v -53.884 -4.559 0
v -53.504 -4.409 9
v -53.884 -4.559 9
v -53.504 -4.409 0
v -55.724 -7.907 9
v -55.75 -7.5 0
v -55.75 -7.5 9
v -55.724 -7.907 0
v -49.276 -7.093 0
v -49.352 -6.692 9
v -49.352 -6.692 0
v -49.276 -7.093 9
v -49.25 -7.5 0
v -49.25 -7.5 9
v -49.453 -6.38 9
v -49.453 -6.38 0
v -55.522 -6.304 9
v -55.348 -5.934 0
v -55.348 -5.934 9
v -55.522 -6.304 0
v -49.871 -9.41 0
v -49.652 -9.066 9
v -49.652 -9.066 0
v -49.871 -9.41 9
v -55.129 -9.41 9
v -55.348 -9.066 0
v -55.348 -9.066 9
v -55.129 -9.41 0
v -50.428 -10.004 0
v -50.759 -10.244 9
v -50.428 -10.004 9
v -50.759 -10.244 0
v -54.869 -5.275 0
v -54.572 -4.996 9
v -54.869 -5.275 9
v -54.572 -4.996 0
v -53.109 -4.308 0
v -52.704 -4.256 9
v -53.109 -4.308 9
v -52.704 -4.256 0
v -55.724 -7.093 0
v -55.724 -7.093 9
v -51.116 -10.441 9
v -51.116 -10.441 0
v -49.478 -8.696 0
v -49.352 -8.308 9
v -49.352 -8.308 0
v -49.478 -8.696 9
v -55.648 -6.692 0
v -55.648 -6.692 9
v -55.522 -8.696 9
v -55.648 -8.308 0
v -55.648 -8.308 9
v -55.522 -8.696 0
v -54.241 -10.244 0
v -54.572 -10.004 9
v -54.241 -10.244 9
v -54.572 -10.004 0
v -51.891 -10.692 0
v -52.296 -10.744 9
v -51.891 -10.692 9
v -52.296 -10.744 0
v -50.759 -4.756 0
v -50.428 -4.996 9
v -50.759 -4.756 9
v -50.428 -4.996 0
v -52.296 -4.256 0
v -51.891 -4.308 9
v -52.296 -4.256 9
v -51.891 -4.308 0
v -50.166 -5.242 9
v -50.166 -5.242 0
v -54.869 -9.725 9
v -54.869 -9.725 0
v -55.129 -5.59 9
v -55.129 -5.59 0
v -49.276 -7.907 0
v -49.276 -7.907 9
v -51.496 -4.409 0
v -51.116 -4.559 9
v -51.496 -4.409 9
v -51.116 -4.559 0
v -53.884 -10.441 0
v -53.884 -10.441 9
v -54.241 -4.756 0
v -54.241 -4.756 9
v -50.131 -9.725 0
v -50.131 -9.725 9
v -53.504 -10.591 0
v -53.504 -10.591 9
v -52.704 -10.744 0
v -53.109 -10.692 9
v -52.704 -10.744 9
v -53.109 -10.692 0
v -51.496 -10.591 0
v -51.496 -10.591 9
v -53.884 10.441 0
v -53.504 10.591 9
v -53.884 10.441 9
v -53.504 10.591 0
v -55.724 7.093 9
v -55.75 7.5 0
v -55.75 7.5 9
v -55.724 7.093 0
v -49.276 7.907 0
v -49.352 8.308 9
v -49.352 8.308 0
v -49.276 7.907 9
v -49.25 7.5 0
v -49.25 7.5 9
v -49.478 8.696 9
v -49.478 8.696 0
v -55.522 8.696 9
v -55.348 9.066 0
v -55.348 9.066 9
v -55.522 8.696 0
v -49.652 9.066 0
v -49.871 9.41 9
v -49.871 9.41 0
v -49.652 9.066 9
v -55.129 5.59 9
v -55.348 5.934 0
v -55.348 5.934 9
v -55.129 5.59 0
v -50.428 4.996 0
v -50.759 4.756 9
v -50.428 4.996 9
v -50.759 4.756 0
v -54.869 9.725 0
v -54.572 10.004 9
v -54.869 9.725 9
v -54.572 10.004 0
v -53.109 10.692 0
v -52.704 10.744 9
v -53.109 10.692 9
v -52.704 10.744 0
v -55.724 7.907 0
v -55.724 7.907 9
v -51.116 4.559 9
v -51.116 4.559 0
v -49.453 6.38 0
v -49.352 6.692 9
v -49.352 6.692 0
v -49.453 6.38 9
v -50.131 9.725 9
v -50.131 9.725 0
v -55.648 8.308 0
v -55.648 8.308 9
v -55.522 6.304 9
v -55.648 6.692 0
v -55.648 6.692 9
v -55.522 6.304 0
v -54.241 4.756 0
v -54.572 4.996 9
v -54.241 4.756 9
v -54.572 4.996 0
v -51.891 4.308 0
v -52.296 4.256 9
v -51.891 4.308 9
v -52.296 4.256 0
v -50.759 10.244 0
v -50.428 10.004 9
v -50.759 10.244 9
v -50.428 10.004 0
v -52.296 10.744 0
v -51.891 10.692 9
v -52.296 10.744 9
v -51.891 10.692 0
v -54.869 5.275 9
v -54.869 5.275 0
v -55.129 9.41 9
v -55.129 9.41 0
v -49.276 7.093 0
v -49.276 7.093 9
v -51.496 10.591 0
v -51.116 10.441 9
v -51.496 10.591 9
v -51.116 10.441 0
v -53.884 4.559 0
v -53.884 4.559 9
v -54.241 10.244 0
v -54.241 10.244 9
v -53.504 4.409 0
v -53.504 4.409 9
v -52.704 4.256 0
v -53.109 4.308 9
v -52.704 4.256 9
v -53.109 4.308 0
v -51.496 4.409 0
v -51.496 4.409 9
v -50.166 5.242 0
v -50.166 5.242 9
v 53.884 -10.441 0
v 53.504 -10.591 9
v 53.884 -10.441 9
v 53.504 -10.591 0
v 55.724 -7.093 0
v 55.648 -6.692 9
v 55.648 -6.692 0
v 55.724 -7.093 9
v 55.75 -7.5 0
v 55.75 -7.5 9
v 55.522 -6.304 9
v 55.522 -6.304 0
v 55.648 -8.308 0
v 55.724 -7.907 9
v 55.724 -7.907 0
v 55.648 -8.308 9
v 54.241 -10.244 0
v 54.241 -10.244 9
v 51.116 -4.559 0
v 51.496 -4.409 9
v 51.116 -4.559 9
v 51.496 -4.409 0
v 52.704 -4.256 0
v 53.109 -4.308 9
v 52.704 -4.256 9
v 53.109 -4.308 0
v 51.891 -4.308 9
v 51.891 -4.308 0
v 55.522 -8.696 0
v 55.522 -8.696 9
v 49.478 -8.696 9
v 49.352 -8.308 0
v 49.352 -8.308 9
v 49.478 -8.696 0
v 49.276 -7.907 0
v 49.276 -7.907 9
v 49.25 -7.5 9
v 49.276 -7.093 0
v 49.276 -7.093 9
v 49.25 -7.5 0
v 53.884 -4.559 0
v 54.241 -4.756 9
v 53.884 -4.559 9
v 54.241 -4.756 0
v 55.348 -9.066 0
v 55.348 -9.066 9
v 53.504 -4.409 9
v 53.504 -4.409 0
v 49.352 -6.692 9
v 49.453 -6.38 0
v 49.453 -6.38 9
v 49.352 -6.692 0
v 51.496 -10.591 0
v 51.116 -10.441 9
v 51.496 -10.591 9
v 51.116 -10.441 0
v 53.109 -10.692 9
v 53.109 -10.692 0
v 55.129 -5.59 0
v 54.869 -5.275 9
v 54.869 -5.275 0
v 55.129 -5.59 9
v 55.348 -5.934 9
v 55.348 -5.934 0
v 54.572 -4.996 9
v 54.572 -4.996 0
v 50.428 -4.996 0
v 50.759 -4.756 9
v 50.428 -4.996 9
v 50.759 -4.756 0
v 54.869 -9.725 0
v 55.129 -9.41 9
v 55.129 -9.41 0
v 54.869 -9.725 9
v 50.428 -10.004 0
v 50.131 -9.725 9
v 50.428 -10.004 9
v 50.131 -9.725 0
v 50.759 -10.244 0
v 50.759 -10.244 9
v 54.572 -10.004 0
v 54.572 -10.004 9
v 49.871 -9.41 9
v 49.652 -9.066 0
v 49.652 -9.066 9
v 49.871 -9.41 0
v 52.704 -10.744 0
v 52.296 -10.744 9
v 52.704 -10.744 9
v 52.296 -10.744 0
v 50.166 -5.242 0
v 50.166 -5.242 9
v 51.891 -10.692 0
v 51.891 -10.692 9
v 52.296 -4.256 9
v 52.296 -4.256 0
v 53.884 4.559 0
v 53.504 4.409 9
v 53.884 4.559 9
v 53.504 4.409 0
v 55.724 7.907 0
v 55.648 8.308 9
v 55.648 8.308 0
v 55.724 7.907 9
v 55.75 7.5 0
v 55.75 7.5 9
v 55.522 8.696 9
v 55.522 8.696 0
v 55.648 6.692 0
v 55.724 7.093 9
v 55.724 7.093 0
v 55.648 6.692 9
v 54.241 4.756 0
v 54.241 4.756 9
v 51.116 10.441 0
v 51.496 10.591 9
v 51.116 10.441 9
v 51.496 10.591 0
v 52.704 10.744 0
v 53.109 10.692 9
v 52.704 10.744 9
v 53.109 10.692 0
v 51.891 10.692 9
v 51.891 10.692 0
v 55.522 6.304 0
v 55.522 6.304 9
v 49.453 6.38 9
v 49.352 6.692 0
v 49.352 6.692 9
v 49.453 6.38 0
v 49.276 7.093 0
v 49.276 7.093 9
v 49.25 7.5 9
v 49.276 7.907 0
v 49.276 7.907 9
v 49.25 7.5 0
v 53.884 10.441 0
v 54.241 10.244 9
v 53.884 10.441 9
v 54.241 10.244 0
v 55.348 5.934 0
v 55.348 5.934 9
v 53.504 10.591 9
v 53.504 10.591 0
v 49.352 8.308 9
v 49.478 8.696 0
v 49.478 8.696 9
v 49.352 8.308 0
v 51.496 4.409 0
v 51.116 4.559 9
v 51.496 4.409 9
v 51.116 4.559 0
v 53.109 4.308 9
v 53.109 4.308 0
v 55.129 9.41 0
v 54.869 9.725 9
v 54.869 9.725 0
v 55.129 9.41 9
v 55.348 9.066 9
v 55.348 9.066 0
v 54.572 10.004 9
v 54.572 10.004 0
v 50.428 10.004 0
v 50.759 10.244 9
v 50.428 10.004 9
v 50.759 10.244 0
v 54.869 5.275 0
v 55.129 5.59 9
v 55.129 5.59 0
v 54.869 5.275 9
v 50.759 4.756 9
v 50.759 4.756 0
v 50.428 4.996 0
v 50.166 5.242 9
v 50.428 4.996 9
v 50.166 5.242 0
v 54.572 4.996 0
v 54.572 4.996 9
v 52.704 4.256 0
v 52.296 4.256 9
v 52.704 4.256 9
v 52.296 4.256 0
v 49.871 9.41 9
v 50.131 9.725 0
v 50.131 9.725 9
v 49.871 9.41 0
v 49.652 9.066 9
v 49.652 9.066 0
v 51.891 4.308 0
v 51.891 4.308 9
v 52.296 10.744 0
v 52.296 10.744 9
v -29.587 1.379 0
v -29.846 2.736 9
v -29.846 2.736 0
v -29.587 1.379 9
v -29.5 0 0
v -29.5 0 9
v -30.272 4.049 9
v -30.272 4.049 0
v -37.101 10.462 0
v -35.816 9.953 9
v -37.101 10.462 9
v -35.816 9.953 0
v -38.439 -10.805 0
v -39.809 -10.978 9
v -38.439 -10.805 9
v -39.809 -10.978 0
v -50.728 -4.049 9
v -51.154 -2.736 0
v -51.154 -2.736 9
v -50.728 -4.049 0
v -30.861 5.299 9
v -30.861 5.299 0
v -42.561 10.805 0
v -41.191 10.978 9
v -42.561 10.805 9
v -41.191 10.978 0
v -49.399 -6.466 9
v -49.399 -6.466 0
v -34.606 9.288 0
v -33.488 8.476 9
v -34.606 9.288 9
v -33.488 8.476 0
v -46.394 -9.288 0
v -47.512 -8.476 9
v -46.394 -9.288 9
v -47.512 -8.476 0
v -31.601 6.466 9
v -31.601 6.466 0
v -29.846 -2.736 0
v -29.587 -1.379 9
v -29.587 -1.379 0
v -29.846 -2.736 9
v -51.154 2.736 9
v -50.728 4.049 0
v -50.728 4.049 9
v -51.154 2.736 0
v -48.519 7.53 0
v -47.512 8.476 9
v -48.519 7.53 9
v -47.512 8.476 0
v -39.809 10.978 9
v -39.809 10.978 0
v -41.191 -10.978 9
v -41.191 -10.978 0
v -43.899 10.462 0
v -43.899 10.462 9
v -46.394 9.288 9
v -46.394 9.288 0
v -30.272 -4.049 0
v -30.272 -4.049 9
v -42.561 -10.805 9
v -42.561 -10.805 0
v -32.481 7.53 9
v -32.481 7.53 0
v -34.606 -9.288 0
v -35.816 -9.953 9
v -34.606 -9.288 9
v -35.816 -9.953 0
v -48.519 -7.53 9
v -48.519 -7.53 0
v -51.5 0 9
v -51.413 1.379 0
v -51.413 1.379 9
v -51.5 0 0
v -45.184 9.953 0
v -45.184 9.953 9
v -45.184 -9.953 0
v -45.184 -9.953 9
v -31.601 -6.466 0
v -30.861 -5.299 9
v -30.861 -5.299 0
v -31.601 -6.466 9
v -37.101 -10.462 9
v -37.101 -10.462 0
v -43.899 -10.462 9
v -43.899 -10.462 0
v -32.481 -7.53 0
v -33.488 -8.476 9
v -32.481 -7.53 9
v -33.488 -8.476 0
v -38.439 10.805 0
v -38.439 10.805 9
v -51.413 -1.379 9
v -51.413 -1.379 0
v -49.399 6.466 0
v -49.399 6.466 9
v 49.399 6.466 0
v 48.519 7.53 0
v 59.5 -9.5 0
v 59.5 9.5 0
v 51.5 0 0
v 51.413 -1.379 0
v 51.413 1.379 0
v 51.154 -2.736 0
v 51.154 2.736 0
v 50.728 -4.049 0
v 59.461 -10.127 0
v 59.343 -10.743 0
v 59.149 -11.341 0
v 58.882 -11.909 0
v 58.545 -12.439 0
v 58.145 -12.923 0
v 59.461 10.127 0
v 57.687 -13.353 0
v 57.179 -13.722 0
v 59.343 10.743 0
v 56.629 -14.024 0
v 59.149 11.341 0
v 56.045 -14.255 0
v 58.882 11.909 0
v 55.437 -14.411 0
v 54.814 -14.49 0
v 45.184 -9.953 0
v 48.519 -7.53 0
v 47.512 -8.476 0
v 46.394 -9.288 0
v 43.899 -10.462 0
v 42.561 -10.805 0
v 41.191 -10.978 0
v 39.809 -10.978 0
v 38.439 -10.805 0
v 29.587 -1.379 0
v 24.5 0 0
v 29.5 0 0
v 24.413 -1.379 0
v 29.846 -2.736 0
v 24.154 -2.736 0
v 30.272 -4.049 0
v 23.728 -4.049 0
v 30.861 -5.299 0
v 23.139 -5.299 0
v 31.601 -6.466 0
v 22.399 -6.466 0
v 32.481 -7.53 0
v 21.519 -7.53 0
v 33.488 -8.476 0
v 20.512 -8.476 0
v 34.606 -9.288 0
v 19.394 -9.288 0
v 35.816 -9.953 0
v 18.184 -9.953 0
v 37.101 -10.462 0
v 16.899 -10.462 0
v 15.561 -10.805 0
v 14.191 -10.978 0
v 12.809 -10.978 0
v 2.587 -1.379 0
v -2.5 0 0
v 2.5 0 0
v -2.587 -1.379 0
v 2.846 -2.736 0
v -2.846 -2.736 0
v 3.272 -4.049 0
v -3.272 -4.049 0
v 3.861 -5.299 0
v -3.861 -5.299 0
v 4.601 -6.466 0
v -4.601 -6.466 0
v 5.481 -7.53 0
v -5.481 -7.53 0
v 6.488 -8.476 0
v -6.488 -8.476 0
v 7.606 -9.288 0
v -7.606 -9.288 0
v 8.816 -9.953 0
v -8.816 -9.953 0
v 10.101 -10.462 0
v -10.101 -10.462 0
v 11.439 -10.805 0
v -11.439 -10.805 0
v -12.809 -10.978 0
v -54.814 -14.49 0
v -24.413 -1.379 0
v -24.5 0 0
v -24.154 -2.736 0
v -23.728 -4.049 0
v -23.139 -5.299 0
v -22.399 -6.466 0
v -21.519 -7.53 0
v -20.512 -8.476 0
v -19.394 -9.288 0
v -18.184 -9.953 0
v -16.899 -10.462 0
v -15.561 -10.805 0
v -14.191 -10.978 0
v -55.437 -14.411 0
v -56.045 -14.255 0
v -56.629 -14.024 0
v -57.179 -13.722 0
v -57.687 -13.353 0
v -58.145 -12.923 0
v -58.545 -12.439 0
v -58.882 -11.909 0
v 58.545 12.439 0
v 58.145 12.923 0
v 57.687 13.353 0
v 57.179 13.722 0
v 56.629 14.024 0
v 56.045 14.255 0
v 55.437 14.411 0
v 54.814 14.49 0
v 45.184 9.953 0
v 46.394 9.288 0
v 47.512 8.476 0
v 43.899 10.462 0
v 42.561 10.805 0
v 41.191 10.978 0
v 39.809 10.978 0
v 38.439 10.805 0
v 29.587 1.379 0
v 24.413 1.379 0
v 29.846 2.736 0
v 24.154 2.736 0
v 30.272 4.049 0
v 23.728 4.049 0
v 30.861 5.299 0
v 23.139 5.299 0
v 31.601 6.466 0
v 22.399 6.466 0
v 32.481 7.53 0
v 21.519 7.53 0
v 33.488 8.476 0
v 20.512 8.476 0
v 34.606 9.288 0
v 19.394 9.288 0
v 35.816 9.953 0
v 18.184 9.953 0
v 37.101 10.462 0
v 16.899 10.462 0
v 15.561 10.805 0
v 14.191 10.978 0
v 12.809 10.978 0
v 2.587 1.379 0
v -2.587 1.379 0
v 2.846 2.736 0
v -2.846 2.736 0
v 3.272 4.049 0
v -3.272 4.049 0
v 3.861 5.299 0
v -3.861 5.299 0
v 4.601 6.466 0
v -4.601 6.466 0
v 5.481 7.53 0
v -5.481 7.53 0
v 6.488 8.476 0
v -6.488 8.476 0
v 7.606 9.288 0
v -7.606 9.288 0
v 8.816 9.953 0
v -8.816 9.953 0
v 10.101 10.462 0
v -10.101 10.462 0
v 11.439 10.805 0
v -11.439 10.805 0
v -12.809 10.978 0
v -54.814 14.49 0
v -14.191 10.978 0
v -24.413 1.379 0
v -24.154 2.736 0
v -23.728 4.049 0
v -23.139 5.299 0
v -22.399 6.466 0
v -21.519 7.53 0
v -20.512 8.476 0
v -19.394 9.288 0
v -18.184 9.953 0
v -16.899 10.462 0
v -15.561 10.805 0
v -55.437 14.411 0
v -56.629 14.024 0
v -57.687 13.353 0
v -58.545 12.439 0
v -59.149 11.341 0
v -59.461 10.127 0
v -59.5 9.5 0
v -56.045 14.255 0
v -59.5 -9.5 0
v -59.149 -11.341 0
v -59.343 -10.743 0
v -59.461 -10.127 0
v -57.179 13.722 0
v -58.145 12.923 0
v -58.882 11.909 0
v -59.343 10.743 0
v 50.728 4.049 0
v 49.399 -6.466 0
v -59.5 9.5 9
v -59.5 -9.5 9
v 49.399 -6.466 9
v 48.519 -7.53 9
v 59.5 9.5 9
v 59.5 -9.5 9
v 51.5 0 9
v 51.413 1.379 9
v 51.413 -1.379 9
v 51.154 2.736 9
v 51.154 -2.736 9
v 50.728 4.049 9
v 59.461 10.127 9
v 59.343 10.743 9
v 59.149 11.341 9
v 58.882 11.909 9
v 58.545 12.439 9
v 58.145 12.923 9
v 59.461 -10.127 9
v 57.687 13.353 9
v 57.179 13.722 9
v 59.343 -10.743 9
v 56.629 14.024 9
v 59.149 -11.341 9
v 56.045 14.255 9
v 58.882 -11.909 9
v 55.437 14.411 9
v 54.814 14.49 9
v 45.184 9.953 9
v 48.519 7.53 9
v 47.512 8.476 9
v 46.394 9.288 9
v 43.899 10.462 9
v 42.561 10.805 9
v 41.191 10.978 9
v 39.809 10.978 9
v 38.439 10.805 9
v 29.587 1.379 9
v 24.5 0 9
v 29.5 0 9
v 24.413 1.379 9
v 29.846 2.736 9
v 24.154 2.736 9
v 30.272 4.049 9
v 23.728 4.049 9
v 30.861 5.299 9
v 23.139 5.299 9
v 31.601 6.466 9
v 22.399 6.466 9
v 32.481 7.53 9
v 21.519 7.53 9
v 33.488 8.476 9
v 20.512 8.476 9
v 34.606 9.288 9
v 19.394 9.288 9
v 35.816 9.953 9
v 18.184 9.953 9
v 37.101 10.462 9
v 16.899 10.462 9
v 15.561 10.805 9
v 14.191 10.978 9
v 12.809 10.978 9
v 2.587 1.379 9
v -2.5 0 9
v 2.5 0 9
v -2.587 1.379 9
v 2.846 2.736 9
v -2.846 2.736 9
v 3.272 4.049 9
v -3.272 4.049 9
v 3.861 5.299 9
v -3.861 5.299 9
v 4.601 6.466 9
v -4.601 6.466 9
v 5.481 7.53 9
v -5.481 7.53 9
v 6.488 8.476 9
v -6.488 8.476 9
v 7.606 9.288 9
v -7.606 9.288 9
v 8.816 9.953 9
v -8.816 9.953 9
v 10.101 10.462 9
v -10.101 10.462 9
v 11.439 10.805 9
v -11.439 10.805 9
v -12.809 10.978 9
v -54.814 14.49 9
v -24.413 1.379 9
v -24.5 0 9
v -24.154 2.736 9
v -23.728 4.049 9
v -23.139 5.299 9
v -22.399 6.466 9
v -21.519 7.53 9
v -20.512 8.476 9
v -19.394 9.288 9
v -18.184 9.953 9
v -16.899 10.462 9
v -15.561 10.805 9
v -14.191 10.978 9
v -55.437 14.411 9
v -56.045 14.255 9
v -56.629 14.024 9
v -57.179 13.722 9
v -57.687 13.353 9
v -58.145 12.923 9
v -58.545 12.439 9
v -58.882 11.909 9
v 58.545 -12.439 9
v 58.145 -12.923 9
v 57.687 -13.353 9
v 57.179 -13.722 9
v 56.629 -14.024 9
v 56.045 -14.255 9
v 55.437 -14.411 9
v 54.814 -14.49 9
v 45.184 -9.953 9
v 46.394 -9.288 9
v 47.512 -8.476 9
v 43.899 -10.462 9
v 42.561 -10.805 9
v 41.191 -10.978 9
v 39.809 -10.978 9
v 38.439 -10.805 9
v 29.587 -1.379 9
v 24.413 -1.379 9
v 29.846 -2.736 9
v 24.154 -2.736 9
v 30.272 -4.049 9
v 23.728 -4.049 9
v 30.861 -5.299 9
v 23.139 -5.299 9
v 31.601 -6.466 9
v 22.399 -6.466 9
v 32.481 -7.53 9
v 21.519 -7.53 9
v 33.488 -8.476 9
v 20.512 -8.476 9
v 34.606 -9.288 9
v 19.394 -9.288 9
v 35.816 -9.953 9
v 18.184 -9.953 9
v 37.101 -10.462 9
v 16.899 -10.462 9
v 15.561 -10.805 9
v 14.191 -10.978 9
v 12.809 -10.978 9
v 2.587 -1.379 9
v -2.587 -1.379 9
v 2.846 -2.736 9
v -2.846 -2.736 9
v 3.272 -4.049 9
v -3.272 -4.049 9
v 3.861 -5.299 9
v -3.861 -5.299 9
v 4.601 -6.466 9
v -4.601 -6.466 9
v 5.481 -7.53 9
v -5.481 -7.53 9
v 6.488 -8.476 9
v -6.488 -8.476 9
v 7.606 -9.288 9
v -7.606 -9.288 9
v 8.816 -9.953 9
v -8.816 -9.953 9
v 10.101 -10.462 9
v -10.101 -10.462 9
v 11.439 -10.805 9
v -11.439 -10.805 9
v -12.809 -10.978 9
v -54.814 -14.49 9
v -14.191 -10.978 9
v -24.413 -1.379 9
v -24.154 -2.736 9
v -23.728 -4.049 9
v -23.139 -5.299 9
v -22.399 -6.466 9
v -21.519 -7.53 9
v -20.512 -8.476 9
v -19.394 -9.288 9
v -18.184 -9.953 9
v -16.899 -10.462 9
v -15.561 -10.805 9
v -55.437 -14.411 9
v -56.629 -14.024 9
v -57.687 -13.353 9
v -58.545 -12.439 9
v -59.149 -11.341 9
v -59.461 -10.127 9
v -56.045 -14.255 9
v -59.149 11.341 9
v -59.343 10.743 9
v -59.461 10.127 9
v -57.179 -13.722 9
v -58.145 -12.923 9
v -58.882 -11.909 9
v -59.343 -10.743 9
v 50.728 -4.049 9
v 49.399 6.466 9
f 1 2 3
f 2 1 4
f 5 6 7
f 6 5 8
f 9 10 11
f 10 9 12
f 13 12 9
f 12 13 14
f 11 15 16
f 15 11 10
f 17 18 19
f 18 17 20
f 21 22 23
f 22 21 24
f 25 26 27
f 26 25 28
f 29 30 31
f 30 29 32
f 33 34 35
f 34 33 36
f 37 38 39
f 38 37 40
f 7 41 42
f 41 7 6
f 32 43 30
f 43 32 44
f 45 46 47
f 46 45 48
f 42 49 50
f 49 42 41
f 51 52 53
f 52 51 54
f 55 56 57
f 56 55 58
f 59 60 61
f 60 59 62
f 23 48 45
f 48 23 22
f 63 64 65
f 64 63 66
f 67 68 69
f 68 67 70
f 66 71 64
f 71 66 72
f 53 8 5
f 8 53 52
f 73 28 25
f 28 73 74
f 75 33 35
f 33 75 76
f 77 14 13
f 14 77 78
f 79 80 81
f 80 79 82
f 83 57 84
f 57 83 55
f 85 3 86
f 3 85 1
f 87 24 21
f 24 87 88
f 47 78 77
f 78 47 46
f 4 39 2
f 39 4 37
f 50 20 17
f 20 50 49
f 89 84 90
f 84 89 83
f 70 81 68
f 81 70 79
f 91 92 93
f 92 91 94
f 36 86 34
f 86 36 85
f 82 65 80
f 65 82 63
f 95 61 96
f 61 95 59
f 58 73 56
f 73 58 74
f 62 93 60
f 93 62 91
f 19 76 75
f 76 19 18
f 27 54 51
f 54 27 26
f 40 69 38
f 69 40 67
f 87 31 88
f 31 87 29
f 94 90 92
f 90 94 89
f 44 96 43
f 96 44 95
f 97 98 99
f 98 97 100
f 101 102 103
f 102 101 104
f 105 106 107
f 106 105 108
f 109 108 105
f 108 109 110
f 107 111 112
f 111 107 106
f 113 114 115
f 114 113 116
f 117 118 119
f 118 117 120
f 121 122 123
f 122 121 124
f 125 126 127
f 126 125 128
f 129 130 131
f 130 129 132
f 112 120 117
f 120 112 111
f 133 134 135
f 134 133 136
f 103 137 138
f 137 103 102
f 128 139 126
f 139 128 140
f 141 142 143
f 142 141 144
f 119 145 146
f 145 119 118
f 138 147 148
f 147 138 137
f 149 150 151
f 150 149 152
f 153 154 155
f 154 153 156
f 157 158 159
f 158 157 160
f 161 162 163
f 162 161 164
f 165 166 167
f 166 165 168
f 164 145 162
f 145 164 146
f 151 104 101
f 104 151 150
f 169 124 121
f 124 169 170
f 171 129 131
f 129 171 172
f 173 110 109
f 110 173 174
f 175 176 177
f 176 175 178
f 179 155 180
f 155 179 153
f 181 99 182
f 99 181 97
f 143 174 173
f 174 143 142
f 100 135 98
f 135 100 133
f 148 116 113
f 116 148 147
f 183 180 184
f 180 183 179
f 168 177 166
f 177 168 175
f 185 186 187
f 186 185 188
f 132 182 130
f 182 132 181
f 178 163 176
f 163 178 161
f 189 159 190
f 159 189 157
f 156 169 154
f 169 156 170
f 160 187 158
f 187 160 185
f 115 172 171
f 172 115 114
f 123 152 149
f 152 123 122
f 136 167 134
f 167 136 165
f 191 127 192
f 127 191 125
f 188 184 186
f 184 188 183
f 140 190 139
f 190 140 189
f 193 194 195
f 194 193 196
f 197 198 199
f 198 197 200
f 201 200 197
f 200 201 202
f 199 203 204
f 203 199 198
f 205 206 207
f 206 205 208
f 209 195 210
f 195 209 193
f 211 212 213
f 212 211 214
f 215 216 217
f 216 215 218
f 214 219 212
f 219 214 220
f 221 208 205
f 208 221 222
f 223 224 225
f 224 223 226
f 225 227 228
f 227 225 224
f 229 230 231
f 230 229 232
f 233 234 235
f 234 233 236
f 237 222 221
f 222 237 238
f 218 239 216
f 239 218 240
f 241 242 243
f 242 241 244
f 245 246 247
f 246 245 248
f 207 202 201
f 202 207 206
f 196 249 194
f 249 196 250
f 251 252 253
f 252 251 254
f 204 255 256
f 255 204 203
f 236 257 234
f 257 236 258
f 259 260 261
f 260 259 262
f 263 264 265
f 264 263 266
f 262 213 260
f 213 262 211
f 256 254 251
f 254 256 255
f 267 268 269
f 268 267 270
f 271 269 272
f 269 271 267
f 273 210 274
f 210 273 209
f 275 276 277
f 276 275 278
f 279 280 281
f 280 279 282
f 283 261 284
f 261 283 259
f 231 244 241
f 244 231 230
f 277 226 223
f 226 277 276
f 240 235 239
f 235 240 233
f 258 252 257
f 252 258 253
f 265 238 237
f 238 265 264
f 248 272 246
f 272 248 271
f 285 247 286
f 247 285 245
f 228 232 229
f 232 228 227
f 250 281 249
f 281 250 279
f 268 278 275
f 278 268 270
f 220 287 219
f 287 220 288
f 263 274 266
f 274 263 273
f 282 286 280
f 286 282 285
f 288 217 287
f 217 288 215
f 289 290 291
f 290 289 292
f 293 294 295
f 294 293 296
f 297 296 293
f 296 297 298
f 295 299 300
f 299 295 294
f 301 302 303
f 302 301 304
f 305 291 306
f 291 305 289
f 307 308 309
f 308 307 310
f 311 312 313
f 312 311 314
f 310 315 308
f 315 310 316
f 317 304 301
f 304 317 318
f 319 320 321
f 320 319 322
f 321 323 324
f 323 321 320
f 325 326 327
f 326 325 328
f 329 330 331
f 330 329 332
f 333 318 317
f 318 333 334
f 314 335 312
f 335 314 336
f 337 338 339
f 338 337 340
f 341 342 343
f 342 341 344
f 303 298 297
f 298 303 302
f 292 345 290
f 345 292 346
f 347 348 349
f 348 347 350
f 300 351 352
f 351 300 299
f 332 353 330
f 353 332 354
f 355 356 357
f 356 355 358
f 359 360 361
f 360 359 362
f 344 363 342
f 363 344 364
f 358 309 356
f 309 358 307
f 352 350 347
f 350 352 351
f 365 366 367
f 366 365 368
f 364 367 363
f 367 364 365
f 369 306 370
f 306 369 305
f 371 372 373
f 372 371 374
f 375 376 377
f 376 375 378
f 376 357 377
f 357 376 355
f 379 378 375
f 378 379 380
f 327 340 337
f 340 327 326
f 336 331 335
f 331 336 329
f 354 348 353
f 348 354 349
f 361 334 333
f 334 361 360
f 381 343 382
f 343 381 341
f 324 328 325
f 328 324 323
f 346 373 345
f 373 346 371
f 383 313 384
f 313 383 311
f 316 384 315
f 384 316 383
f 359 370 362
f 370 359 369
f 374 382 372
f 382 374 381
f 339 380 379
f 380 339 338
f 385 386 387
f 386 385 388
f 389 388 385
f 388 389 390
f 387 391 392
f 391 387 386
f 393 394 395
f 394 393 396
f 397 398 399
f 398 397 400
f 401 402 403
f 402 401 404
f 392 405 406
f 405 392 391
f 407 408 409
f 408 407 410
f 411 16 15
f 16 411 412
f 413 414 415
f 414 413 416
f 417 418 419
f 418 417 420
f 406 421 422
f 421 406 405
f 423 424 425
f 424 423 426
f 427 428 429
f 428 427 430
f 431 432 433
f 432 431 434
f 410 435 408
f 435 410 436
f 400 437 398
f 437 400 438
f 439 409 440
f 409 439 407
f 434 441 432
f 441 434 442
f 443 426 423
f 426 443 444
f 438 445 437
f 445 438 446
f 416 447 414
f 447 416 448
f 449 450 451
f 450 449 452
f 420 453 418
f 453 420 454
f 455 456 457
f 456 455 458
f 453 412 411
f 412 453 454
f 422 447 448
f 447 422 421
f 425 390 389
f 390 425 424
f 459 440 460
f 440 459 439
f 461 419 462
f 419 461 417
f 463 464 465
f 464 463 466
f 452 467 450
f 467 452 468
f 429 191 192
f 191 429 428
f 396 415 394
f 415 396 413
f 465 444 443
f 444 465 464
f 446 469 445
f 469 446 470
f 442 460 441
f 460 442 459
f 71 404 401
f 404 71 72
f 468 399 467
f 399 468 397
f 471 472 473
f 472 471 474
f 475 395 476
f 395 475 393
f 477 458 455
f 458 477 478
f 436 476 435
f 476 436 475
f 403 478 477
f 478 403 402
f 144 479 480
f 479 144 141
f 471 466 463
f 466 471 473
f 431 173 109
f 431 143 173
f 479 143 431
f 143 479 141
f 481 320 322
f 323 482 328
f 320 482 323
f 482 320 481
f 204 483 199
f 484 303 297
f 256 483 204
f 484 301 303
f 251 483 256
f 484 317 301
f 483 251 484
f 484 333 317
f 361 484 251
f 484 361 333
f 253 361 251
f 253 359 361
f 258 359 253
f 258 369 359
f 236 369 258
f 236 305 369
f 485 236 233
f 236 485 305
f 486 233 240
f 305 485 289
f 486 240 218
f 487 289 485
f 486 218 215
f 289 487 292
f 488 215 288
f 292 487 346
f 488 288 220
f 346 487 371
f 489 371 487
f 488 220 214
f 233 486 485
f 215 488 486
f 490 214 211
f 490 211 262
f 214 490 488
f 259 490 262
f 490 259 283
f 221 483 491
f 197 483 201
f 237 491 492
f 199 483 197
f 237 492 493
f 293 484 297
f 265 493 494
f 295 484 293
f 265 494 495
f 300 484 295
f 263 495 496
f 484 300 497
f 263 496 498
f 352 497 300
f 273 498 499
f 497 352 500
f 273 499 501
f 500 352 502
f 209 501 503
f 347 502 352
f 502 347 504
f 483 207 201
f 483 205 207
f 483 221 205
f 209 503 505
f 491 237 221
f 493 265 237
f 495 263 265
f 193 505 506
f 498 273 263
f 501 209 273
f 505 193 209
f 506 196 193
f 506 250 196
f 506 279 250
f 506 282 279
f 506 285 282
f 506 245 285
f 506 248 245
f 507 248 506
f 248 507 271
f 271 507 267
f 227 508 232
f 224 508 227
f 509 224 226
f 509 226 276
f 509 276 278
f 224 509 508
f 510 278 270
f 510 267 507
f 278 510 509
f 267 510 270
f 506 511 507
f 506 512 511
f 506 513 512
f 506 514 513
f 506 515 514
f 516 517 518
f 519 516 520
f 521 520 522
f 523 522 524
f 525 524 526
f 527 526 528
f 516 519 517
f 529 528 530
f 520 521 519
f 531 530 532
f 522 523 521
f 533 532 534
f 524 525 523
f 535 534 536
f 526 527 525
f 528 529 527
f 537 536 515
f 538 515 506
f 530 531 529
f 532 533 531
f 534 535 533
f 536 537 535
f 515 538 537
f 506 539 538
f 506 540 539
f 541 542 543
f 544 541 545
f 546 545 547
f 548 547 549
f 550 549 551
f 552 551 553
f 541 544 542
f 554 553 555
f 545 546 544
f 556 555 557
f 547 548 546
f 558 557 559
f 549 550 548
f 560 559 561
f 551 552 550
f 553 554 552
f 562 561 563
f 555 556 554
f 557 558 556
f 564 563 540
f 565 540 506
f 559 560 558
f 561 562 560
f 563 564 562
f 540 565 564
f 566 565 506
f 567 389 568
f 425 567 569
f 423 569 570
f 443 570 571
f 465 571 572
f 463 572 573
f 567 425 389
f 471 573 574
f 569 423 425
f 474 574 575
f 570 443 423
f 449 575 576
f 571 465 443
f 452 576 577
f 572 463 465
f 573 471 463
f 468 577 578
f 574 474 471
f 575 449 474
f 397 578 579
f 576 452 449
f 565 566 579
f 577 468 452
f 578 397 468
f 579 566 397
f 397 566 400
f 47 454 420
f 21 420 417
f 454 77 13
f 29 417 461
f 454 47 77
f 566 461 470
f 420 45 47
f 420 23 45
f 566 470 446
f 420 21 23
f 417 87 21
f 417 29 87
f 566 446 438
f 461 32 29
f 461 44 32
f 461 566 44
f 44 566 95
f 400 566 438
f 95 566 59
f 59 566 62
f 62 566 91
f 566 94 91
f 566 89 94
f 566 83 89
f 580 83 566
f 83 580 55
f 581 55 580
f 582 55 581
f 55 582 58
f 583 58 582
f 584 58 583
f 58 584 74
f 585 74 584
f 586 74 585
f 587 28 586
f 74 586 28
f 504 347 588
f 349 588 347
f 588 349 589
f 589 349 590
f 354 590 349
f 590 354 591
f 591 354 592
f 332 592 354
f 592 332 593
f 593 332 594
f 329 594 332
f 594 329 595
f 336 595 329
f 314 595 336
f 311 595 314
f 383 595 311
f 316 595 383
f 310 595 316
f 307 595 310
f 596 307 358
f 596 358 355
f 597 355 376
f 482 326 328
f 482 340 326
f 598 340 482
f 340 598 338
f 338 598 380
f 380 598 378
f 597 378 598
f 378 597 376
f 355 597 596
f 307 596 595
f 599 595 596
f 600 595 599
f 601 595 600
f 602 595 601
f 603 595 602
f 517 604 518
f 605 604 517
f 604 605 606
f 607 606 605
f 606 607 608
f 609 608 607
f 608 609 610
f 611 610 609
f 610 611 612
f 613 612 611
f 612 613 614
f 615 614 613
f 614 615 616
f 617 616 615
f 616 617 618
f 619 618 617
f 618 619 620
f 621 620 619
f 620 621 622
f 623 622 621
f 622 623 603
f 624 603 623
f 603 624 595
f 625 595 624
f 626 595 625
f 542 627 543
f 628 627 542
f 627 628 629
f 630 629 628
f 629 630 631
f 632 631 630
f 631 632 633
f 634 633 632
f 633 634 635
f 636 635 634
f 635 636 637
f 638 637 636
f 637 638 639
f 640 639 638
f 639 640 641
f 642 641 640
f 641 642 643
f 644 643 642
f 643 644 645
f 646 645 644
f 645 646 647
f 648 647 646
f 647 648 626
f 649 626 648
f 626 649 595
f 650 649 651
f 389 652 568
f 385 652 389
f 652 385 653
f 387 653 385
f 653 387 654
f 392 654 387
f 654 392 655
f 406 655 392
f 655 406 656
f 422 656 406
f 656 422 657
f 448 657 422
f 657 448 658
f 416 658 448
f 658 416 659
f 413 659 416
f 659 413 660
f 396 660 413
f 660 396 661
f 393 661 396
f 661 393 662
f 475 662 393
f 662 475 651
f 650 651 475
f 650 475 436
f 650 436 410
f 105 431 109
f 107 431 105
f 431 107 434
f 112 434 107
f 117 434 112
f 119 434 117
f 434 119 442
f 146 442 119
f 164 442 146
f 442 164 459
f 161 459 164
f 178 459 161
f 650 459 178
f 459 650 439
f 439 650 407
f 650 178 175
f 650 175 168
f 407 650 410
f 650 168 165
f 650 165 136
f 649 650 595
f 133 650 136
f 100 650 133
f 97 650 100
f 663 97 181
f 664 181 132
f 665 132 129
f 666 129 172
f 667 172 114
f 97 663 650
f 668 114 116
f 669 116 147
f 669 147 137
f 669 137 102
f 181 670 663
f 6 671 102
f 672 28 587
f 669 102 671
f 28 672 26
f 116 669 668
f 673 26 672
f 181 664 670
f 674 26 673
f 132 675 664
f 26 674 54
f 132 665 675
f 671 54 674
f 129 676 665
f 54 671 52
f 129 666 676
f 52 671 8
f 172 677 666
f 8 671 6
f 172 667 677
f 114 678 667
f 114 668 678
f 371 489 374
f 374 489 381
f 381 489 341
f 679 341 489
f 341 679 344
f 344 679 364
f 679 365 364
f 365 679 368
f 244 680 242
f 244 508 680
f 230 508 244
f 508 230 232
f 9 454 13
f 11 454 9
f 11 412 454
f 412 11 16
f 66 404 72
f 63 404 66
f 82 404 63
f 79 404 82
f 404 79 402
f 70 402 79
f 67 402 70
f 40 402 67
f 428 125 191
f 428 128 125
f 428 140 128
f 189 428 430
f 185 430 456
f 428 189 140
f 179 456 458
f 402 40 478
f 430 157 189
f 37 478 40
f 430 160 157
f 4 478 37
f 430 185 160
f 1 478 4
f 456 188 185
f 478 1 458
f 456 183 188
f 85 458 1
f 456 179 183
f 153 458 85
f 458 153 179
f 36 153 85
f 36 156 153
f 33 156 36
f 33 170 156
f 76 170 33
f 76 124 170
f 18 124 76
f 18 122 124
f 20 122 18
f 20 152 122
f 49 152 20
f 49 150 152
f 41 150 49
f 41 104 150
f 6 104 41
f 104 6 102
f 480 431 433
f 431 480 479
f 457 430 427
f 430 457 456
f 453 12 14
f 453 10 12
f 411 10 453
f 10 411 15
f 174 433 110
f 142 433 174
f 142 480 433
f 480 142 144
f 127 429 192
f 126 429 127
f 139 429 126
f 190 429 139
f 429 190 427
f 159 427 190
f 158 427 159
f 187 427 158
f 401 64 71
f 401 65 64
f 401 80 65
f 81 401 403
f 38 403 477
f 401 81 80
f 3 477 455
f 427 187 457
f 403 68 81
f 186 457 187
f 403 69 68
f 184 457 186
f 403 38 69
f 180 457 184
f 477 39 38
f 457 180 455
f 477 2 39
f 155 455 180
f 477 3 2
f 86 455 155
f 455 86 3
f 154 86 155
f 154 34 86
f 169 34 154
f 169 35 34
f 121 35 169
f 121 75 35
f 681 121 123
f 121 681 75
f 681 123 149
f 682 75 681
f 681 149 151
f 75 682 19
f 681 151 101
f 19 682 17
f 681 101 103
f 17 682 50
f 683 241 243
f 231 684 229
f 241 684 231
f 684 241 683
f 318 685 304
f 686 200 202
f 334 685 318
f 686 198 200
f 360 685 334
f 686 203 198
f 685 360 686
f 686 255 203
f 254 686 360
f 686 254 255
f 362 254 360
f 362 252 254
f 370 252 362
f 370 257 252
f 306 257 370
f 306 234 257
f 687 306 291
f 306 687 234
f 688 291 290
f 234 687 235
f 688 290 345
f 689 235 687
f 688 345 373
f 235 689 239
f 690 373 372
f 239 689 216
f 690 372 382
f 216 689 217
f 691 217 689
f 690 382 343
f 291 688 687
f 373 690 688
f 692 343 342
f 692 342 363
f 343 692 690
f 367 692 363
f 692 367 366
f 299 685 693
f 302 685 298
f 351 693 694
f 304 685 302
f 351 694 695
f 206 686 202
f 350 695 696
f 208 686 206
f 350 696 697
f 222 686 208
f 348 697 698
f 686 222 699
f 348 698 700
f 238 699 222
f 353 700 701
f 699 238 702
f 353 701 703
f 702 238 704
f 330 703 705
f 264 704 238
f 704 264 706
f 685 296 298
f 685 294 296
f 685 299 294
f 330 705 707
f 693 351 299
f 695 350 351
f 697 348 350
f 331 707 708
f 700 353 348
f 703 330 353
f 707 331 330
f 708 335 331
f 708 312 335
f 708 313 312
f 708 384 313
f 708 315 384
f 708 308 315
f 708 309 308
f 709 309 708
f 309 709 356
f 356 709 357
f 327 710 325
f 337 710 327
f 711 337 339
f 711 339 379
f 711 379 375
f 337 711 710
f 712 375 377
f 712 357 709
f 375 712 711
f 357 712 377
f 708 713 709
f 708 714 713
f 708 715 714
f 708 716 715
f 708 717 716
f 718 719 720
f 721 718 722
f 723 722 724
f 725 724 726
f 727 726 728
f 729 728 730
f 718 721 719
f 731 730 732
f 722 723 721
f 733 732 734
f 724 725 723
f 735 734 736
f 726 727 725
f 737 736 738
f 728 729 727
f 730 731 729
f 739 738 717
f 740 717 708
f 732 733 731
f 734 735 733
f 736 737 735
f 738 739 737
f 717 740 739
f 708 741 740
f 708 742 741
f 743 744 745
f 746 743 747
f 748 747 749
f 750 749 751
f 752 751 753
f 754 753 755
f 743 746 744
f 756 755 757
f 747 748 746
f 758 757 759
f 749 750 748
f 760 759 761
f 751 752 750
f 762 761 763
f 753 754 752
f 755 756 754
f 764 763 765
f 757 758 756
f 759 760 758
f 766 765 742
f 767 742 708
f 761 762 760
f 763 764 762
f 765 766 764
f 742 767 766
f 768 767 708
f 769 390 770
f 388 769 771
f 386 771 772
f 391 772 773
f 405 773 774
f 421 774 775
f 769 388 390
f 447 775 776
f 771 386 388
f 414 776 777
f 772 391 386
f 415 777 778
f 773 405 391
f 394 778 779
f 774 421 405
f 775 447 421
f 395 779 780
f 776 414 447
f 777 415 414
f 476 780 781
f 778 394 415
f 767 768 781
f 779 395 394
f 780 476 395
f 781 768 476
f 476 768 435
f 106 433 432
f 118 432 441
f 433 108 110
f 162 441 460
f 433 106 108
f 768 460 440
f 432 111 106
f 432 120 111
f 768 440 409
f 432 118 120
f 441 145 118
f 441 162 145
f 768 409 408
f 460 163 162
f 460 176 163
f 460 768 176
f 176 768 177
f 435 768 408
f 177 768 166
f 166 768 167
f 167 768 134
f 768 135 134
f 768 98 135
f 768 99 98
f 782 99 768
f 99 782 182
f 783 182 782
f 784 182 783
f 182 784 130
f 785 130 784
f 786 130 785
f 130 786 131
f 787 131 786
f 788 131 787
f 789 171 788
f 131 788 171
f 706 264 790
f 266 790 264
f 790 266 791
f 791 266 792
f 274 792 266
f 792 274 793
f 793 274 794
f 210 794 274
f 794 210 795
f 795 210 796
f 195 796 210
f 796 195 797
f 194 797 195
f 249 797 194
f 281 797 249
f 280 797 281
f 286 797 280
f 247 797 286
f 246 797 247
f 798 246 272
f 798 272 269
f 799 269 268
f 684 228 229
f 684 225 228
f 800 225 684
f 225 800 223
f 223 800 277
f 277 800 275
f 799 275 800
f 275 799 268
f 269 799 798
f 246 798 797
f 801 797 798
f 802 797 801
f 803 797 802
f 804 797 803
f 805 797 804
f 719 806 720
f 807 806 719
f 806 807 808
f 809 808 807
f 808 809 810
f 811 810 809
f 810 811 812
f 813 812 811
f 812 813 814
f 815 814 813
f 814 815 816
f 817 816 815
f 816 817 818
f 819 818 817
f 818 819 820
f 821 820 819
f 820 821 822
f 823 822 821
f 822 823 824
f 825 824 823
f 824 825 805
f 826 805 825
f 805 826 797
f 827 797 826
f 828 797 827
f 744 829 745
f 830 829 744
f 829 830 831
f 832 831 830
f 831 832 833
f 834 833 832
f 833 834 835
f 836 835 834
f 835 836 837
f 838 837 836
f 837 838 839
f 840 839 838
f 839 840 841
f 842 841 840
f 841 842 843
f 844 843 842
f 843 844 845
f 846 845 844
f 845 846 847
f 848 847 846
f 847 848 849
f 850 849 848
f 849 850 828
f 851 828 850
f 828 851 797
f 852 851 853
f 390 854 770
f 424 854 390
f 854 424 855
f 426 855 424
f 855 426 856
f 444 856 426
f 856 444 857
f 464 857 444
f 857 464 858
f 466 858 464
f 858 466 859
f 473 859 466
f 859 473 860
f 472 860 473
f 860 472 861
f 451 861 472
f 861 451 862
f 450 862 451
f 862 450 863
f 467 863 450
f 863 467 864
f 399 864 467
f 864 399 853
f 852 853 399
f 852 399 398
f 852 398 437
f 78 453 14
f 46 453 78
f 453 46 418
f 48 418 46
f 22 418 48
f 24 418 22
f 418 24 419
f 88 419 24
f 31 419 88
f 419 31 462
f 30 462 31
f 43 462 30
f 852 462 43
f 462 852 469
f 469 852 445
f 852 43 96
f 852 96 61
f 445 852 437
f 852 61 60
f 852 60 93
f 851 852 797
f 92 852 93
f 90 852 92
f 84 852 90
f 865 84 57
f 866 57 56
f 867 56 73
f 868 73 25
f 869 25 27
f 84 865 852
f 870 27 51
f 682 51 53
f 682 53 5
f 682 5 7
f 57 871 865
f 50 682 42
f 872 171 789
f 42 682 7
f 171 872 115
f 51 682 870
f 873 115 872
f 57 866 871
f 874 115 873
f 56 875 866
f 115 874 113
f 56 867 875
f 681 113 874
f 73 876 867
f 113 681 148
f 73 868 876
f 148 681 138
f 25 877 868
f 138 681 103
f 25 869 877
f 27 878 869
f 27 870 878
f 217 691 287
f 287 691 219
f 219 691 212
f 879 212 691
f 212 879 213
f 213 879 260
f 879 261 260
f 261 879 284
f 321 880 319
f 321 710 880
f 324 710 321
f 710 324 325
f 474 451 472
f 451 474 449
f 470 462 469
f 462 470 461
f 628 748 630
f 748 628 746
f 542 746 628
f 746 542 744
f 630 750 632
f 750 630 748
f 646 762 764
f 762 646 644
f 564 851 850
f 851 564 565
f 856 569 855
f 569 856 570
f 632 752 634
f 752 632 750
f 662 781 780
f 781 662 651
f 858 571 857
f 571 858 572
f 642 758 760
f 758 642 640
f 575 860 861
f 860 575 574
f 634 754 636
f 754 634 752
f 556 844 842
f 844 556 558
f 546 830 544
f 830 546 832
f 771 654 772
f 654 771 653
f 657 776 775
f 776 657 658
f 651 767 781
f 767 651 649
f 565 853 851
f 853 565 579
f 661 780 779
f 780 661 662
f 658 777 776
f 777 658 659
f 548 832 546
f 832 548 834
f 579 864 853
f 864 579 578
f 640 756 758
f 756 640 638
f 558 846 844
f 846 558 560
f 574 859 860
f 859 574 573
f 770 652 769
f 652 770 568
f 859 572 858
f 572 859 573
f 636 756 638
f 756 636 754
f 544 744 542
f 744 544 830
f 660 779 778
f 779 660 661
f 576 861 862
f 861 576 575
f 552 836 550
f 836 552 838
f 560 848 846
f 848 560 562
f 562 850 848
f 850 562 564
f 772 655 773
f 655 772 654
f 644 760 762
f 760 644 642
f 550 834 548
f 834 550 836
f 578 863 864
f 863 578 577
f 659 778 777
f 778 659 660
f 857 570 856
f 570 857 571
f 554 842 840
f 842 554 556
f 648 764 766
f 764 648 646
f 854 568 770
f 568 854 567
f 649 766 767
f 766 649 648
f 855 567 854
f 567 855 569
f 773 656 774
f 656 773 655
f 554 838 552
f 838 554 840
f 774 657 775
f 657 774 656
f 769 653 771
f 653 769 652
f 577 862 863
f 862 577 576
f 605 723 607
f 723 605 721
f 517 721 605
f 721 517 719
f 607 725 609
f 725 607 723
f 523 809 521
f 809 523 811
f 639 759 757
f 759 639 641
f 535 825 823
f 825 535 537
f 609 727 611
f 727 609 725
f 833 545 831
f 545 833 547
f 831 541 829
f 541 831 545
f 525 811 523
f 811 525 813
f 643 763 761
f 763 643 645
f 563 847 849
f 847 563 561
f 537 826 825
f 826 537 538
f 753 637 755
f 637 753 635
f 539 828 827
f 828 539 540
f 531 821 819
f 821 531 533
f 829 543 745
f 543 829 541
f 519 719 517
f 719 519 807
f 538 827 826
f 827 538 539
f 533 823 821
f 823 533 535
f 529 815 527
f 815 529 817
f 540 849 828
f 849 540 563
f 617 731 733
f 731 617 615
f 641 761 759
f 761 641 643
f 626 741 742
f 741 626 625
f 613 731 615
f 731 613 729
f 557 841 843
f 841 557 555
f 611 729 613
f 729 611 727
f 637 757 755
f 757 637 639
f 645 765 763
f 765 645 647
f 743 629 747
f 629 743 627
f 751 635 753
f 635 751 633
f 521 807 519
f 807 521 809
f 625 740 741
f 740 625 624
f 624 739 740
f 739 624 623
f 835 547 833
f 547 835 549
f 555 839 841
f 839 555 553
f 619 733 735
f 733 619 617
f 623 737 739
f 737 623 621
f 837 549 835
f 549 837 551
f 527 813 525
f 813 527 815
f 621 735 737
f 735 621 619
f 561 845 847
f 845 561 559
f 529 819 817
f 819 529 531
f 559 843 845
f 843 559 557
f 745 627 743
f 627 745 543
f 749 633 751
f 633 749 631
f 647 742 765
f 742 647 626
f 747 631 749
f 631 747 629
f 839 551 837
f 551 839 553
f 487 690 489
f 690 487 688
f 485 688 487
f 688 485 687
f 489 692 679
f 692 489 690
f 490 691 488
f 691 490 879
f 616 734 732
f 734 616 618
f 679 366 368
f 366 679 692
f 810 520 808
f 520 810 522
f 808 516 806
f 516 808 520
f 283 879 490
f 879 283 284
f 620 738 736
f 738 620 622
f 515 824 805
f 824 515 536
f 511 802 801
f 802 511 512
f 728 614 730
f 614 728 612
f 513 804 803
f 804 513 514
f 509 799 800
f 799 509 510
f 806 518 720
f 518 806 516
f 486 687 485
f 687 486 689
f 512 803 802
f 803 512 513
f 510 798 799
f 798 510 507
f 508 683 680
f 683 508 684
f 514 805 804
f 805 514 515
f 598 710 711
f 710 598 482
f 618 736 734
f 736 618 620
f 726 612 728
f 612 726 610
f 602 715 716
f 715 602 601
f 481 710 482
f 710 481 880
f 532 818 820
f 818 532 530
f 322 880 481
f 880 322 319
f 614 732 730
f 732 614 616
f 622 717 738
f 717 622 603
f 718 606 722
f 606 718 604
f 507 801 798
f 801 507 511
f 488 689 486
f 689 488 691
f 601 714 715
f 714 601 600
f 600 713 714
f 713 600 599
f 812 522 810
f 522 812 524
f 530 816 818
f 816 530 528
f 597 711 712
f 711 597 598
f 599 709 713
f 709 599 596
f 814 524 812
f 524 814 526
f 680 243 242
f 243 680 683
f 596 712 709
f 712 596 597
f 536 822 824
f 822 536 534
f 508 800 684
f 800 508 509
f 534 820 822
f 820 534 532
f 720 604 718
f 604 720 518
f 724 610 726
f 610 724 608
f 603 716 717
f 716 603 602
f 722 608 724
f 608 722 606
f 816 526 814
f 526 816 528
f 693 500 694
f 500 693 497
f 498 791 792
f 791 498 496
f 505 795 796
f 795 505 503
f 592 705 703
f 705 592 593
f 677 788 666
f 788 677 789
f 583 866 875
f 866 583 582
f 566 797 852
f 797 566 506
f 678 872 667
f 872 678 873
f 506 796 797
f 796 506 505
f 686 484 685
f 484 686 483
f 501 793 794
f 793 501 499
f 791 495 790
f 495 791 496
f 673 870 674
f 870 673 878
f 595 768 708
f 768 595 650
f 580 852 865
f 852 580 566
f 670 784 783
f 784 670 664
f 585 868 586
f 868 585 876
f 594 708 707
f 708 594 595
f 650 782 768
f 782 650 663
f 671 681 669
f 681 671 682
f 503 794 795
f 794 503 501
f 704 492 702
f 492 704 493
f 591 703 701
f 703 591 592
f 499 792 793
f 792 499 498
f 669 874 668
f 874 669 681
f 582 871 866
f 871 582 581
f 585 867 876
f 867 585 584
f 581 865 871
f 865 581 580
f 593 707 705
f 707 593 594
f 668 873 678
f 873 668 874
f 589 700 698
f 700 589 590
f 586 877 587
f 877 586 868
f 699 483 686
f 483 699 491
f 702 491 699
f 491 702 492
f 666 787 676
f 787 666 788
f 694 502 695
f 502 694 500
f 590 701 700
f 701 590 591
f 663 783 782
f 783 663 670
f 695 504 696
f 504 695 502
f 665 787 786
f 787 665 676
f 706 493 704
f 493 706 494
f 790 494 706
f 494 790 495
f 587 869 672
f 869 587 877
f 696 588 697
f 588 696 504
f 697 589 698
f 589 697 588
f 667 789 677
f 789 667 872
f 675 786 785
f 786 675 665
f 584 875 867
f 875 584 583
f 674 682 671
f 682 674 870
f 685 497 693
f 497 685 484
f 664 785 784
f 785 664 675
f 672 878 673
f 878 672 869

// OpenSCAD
$fn = 50;


difference() {
	union() {
		hull() {
			translate(v = [-54.5000000000, 9.5000000000, 0]) {
				cylinder(h = 9, r = 5);
			}
			translate(v = [54.5000000000, 9.5000000000, 0]) {
				cylinder(h = 9, r = 5);
			}
			translate(v = [-54.5000000000, -9.5000000000, 0]) {
				cylinder(h = 9, r = 5);
			}
			translate(v = [54.5000000000, -9.5000000000, 0]) {
				cylinder(h = 9, r = 5);
			}
		}
	}
	union() {
		#translate(v = [-52.5000000000, -7.5000000000, -100.0000000000]) {
			cylinder(h = 200, r = 3.2500000000);
		}
		#translate(v = [-52.5000000000, 7.5000000000, -100.0000000000]) {
			cylinder(h = 200, r = 3.2500000000);
		}
		#translate(v = [52.5000000000, -7.5000000000, -100.0000000000]) {
			cylinder(h = 200, r = 3.2500000000);
		}
		#translate(v = [52.5000000000, 7.5000000000, -100.0000000000]) {
			cylinder(h = 200, r = 3.2500000000);
		}
		#translate(v = [-40.5000000000, 0, 0]) {
			cylinder(h = 9, r = 11.0000000000);
		}
		#translate(v = [-13.5000000000, 0, 0]) {
			cylinder(h = 9, r = 11.0000000000);
		}
		#translate(v = [13.5000000000, 0, 0]) {
			cylinder(h = 9, r = 11.0000000000);
		}
		#translate(v = [40.5000000000, 0, 0]) {
			cylinder(h = 9, r = 11.0000000000);
		}
	}
}
